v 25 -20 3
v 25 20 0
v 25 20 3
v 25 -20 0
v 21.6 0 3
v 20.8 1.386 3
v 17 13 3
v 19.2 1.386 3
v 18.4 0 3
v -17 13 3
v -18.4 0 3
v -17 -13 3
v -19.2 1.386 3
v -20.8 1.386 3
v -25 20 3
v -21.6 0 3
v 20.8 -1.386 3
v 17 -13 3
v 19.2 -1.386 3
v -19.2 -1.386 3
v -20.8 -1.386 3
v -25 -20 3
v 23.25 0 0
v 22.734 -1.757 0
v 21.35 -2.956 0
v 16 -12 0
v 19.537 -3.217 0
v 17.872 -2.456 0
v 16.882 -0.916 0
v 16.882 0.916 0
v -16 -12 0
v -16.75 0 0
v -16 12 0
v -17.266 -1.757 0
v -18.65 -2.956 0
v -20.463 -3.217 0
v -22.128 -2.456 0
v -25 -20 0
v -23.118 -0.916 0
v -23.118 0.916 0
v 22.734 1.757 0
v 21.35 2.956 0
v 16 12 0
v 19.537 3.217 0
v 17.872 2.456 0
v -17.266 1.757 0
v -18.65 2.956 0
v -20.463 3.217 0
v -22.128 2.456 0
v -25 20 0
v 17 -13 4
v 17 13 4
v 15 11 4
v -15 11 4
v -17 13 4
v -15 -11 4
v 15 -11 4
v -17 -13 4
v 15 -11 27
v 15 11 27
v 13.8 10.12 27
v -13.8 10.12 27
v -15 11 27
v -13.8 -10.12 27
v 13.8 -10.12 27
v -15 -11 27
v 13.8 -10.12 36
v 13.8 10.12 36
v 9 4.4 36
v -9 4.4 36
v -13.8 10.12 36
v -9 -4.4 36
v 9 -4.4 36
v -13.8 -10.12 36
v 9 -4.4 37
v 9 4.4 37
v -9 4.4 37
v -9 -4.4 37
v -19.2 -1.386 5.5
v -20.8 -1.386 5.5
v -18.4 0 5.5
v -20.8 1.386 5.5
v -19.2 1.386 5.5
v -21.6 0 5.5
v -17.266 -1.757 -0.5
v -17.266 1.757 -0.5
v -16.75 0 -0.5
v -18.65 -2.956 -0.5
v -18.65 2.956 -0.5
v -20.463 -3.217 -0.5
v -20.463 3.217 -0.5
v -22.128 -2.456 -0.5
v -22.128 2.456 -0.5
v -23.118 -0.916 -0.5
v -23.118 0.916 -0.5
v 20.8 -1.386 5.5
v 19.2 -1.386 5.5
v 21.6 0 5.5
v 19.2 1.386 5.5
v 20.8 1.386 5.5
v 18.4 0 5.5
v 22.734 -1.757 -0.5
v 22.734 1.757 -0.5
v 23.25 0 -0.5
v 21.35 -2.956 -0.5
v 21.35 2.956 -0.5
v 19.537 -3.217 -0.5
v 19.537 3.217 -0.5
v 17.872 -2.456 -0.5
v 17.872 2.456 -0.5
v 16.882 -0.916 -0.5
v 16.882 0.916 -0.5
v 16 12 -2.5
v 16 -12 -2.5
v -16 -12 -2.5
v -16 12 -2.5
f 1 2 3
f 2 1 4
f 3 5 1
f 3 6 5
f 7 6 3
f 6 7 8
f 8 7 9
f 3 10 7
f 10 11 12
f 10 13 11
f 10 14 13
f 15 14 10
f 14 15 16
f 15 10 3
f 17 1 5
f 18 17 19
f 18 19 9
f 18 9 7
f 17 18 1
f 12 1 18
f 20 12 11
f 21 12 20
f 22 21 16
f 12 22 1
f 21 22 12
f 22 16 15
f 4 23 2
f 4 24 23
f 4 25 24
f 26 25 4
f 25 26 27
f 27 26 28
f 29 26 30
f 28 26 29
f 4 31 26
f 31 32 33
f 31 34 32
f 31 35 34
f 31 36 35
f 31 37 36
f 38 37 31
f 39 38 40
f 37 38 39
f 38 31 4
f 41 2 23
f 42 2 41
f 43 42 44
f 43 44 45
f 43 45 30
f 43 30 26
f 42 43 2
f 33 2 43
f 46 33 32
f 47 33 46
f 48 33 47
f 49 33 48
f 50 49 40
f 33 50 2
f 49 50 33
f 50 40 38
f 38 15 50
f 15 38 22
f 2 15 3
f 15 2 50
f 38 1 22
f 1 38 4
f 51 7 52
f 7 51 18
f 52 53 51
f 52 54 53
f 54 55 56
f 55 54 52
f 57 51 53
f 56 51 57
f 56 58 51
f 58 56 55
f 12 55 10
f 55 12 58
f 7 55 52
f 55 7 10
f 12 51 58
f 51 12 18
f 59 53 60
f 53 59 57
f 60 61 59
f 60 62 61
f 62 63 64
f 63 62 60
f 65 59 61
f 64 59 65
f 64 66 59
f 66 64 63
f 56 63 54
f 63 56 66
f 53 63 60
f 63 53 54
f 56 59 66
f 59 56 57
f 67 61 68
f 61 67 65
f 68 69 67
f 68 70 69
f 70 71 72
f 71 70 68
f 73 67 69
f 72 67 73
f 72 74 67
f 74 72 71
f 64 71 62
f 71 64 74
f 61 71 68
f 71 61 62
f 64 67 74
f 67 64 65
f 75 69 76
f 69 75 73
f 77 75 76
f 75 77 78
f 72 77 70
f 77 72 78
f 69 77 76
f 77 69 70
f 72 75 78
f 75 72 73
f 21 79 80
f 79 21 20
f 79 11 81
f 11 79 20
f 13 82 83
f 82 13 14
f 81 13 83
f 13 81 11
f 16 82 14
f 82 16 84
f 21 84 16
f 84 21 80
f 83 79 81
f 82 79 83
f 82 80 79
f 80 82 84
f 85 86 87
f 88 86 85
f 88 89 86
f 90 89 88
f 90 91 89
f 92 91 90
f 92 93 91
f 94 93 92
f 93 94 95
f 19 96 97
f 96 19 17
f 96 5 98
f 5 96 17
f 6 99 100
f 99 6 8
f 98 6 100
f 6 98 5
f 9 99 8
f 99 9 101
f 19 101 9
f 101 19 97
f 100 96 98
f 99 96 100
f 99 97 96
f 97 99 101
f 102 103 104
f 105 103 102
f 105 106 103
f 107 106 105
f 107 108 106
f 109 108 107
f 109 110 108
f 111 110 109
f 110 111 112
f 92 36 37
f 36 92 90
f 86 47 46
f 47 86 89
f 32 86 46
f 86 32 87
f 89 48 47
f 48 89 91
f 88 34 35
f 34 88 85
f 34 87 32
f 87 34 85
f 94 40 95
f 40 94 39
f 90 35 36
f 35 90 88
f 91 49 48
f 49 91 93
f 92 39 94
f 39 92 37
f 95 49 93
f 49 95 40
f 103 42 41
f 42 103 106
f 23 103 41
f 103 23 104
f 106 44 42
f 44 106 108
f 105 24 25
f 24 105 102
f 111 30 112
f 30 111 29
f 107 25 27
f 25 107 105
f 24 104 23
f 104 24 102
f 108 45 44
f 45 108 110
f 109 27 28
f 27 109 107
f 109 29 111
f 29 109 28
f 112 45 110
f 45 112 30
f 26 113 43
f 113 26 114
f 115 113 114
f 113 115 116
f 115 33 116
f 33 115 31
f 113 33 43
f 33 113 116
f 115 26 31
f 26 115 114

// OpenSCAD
// Parameters
iec_type = 0; //[0:0:1]
male = 0; //[0:1:1]
panel_thickness = 2.5; //[1.0:5.0:0.1]
mounting_screw_type = 3; //[2:5:1]
overall_width = 50; //[25:100:1]
overall_height = 40; //[20:80:1]
overall_depth = 28; //[14:56:1]
flange_thickness = 3; //[1.5:6:0.1]
bezel_thickness = 2; //[1:5:0.1]
body_corner_radius = 3; //[1.5:6:0.1]
flange_corner_radius = 4; //[2:8:0.1]
bezel_corner_radius = 3; //[1.5:6:0.1]
screw_hole_pitch = 40; //[20:80:1]
screw_hole_diameter = 3.2; //[2.0:6.0:0.1]
socket_opening_width = 24.5; //[12:40:0.1]
socket_opening_height = 16.3; //[8:30:0.1]
socket_opening_depth = 17; //[8:30:0.1]
body_width = 30; //[15:60:1]
body_height = 22; //[11:44:1]
bezel_width = 34; //[17:68:1]
bezel_height = 26; //[13:52:1]
rear_body_depth = 10; //[5:20:1]
countersink_diameter = 6.5; //[4.0:12.0:0.1]
countersink_depth = 1.5; //[0.5:4.0:0.1]
overlap = 1; //[0.5:2:0.1]

// IEC Connector - complete geometry
module iec() {
  color("Black") {
    // Flange
    translate([0, 0, flange_thickness/2])
      cube([overall_width, overall_height, flange_thickness], center=true);

    // Bezel
    translate([0, 0, flange_thickness + bezel_thickness/2 - overlap])
      cube([bezel_width, bezel_height, bezel_thickness], center=true);

    // Connector Body
    translate([0, 0, flange_thickness + bezel_thickness - overlap + (overall_depth - flange_thickness - bezel_thickness)/2])
      cube([body_width, body_height, overall_depth - flange_thickness - bezel_thickness], center=true);

    // Rear Body
    translate([0, 0, flange_thickness + bezel_thickness - overlap + (overall_depth - flange_thickness - bezel_thickness) - overlap + rear_body_depth/2])
      cube([body_width*0.92, body_height*0.92, rear_body_depth], center=true);

    // Pin or Spade Terminals
    translate([0, 0, flange_thickness + bezel_thickness - overlap + (overall_depth - flange_thickness - bezel_thickness) + rear_body_depth - overlap/2])
      cube([body_width*0.6, body_height*0.4, overlap], center=true);
  }

  // Socket Orifice
  translate([0, 0, flange_thickness + bezel_thickness - overlap + (socket_opening_depth + overlap)/2])
    color("White")
    cube([socket_opening_width, socket_opening_height, socket_opening_depth + overlap], center=true);

  // Screw Mount Holes
  color("Silver") {
    translate([-screw_hole_pitch/2, 0, (flange_thickness + bezel_thickness)/2])
      cylinder(r=screw_hole_diameter/2, h=flange_thickness + bezel_thickness + overlap, center=true);
    translate([screw_hole_pitch/2, 0, (flange_thickness + bezel_thickness)/2])
      cylinder(r=screw_hole_diameter/2, h=flange_thickness + bezel_thickness + overlap, center=true);
  }

  // Screw Countersinks
  color("DimGray") {
    translate([-screw_hole_pitch/2, 0, countersink_depth/2])
      cylinder(r=countersink_diameter/2, h=countersink_depth + overlap, center=true);
    translate([screw_hole_pitch/2, 0, countersink_depth/2])
      cylinder(r=countersink_diameter/2, h=countersink_depth + overlap, center=true);
  }

  // Panel Cutout Reference
  translate([0, 0, -panel_thickness/2])
    color("Gray")
    cube([bezel_width - 2*overlap, bezel_height - 2*overlap, panel_thickness], center=true);
}

// Assembly
module assembly() {
  iec();
}

assembly();
